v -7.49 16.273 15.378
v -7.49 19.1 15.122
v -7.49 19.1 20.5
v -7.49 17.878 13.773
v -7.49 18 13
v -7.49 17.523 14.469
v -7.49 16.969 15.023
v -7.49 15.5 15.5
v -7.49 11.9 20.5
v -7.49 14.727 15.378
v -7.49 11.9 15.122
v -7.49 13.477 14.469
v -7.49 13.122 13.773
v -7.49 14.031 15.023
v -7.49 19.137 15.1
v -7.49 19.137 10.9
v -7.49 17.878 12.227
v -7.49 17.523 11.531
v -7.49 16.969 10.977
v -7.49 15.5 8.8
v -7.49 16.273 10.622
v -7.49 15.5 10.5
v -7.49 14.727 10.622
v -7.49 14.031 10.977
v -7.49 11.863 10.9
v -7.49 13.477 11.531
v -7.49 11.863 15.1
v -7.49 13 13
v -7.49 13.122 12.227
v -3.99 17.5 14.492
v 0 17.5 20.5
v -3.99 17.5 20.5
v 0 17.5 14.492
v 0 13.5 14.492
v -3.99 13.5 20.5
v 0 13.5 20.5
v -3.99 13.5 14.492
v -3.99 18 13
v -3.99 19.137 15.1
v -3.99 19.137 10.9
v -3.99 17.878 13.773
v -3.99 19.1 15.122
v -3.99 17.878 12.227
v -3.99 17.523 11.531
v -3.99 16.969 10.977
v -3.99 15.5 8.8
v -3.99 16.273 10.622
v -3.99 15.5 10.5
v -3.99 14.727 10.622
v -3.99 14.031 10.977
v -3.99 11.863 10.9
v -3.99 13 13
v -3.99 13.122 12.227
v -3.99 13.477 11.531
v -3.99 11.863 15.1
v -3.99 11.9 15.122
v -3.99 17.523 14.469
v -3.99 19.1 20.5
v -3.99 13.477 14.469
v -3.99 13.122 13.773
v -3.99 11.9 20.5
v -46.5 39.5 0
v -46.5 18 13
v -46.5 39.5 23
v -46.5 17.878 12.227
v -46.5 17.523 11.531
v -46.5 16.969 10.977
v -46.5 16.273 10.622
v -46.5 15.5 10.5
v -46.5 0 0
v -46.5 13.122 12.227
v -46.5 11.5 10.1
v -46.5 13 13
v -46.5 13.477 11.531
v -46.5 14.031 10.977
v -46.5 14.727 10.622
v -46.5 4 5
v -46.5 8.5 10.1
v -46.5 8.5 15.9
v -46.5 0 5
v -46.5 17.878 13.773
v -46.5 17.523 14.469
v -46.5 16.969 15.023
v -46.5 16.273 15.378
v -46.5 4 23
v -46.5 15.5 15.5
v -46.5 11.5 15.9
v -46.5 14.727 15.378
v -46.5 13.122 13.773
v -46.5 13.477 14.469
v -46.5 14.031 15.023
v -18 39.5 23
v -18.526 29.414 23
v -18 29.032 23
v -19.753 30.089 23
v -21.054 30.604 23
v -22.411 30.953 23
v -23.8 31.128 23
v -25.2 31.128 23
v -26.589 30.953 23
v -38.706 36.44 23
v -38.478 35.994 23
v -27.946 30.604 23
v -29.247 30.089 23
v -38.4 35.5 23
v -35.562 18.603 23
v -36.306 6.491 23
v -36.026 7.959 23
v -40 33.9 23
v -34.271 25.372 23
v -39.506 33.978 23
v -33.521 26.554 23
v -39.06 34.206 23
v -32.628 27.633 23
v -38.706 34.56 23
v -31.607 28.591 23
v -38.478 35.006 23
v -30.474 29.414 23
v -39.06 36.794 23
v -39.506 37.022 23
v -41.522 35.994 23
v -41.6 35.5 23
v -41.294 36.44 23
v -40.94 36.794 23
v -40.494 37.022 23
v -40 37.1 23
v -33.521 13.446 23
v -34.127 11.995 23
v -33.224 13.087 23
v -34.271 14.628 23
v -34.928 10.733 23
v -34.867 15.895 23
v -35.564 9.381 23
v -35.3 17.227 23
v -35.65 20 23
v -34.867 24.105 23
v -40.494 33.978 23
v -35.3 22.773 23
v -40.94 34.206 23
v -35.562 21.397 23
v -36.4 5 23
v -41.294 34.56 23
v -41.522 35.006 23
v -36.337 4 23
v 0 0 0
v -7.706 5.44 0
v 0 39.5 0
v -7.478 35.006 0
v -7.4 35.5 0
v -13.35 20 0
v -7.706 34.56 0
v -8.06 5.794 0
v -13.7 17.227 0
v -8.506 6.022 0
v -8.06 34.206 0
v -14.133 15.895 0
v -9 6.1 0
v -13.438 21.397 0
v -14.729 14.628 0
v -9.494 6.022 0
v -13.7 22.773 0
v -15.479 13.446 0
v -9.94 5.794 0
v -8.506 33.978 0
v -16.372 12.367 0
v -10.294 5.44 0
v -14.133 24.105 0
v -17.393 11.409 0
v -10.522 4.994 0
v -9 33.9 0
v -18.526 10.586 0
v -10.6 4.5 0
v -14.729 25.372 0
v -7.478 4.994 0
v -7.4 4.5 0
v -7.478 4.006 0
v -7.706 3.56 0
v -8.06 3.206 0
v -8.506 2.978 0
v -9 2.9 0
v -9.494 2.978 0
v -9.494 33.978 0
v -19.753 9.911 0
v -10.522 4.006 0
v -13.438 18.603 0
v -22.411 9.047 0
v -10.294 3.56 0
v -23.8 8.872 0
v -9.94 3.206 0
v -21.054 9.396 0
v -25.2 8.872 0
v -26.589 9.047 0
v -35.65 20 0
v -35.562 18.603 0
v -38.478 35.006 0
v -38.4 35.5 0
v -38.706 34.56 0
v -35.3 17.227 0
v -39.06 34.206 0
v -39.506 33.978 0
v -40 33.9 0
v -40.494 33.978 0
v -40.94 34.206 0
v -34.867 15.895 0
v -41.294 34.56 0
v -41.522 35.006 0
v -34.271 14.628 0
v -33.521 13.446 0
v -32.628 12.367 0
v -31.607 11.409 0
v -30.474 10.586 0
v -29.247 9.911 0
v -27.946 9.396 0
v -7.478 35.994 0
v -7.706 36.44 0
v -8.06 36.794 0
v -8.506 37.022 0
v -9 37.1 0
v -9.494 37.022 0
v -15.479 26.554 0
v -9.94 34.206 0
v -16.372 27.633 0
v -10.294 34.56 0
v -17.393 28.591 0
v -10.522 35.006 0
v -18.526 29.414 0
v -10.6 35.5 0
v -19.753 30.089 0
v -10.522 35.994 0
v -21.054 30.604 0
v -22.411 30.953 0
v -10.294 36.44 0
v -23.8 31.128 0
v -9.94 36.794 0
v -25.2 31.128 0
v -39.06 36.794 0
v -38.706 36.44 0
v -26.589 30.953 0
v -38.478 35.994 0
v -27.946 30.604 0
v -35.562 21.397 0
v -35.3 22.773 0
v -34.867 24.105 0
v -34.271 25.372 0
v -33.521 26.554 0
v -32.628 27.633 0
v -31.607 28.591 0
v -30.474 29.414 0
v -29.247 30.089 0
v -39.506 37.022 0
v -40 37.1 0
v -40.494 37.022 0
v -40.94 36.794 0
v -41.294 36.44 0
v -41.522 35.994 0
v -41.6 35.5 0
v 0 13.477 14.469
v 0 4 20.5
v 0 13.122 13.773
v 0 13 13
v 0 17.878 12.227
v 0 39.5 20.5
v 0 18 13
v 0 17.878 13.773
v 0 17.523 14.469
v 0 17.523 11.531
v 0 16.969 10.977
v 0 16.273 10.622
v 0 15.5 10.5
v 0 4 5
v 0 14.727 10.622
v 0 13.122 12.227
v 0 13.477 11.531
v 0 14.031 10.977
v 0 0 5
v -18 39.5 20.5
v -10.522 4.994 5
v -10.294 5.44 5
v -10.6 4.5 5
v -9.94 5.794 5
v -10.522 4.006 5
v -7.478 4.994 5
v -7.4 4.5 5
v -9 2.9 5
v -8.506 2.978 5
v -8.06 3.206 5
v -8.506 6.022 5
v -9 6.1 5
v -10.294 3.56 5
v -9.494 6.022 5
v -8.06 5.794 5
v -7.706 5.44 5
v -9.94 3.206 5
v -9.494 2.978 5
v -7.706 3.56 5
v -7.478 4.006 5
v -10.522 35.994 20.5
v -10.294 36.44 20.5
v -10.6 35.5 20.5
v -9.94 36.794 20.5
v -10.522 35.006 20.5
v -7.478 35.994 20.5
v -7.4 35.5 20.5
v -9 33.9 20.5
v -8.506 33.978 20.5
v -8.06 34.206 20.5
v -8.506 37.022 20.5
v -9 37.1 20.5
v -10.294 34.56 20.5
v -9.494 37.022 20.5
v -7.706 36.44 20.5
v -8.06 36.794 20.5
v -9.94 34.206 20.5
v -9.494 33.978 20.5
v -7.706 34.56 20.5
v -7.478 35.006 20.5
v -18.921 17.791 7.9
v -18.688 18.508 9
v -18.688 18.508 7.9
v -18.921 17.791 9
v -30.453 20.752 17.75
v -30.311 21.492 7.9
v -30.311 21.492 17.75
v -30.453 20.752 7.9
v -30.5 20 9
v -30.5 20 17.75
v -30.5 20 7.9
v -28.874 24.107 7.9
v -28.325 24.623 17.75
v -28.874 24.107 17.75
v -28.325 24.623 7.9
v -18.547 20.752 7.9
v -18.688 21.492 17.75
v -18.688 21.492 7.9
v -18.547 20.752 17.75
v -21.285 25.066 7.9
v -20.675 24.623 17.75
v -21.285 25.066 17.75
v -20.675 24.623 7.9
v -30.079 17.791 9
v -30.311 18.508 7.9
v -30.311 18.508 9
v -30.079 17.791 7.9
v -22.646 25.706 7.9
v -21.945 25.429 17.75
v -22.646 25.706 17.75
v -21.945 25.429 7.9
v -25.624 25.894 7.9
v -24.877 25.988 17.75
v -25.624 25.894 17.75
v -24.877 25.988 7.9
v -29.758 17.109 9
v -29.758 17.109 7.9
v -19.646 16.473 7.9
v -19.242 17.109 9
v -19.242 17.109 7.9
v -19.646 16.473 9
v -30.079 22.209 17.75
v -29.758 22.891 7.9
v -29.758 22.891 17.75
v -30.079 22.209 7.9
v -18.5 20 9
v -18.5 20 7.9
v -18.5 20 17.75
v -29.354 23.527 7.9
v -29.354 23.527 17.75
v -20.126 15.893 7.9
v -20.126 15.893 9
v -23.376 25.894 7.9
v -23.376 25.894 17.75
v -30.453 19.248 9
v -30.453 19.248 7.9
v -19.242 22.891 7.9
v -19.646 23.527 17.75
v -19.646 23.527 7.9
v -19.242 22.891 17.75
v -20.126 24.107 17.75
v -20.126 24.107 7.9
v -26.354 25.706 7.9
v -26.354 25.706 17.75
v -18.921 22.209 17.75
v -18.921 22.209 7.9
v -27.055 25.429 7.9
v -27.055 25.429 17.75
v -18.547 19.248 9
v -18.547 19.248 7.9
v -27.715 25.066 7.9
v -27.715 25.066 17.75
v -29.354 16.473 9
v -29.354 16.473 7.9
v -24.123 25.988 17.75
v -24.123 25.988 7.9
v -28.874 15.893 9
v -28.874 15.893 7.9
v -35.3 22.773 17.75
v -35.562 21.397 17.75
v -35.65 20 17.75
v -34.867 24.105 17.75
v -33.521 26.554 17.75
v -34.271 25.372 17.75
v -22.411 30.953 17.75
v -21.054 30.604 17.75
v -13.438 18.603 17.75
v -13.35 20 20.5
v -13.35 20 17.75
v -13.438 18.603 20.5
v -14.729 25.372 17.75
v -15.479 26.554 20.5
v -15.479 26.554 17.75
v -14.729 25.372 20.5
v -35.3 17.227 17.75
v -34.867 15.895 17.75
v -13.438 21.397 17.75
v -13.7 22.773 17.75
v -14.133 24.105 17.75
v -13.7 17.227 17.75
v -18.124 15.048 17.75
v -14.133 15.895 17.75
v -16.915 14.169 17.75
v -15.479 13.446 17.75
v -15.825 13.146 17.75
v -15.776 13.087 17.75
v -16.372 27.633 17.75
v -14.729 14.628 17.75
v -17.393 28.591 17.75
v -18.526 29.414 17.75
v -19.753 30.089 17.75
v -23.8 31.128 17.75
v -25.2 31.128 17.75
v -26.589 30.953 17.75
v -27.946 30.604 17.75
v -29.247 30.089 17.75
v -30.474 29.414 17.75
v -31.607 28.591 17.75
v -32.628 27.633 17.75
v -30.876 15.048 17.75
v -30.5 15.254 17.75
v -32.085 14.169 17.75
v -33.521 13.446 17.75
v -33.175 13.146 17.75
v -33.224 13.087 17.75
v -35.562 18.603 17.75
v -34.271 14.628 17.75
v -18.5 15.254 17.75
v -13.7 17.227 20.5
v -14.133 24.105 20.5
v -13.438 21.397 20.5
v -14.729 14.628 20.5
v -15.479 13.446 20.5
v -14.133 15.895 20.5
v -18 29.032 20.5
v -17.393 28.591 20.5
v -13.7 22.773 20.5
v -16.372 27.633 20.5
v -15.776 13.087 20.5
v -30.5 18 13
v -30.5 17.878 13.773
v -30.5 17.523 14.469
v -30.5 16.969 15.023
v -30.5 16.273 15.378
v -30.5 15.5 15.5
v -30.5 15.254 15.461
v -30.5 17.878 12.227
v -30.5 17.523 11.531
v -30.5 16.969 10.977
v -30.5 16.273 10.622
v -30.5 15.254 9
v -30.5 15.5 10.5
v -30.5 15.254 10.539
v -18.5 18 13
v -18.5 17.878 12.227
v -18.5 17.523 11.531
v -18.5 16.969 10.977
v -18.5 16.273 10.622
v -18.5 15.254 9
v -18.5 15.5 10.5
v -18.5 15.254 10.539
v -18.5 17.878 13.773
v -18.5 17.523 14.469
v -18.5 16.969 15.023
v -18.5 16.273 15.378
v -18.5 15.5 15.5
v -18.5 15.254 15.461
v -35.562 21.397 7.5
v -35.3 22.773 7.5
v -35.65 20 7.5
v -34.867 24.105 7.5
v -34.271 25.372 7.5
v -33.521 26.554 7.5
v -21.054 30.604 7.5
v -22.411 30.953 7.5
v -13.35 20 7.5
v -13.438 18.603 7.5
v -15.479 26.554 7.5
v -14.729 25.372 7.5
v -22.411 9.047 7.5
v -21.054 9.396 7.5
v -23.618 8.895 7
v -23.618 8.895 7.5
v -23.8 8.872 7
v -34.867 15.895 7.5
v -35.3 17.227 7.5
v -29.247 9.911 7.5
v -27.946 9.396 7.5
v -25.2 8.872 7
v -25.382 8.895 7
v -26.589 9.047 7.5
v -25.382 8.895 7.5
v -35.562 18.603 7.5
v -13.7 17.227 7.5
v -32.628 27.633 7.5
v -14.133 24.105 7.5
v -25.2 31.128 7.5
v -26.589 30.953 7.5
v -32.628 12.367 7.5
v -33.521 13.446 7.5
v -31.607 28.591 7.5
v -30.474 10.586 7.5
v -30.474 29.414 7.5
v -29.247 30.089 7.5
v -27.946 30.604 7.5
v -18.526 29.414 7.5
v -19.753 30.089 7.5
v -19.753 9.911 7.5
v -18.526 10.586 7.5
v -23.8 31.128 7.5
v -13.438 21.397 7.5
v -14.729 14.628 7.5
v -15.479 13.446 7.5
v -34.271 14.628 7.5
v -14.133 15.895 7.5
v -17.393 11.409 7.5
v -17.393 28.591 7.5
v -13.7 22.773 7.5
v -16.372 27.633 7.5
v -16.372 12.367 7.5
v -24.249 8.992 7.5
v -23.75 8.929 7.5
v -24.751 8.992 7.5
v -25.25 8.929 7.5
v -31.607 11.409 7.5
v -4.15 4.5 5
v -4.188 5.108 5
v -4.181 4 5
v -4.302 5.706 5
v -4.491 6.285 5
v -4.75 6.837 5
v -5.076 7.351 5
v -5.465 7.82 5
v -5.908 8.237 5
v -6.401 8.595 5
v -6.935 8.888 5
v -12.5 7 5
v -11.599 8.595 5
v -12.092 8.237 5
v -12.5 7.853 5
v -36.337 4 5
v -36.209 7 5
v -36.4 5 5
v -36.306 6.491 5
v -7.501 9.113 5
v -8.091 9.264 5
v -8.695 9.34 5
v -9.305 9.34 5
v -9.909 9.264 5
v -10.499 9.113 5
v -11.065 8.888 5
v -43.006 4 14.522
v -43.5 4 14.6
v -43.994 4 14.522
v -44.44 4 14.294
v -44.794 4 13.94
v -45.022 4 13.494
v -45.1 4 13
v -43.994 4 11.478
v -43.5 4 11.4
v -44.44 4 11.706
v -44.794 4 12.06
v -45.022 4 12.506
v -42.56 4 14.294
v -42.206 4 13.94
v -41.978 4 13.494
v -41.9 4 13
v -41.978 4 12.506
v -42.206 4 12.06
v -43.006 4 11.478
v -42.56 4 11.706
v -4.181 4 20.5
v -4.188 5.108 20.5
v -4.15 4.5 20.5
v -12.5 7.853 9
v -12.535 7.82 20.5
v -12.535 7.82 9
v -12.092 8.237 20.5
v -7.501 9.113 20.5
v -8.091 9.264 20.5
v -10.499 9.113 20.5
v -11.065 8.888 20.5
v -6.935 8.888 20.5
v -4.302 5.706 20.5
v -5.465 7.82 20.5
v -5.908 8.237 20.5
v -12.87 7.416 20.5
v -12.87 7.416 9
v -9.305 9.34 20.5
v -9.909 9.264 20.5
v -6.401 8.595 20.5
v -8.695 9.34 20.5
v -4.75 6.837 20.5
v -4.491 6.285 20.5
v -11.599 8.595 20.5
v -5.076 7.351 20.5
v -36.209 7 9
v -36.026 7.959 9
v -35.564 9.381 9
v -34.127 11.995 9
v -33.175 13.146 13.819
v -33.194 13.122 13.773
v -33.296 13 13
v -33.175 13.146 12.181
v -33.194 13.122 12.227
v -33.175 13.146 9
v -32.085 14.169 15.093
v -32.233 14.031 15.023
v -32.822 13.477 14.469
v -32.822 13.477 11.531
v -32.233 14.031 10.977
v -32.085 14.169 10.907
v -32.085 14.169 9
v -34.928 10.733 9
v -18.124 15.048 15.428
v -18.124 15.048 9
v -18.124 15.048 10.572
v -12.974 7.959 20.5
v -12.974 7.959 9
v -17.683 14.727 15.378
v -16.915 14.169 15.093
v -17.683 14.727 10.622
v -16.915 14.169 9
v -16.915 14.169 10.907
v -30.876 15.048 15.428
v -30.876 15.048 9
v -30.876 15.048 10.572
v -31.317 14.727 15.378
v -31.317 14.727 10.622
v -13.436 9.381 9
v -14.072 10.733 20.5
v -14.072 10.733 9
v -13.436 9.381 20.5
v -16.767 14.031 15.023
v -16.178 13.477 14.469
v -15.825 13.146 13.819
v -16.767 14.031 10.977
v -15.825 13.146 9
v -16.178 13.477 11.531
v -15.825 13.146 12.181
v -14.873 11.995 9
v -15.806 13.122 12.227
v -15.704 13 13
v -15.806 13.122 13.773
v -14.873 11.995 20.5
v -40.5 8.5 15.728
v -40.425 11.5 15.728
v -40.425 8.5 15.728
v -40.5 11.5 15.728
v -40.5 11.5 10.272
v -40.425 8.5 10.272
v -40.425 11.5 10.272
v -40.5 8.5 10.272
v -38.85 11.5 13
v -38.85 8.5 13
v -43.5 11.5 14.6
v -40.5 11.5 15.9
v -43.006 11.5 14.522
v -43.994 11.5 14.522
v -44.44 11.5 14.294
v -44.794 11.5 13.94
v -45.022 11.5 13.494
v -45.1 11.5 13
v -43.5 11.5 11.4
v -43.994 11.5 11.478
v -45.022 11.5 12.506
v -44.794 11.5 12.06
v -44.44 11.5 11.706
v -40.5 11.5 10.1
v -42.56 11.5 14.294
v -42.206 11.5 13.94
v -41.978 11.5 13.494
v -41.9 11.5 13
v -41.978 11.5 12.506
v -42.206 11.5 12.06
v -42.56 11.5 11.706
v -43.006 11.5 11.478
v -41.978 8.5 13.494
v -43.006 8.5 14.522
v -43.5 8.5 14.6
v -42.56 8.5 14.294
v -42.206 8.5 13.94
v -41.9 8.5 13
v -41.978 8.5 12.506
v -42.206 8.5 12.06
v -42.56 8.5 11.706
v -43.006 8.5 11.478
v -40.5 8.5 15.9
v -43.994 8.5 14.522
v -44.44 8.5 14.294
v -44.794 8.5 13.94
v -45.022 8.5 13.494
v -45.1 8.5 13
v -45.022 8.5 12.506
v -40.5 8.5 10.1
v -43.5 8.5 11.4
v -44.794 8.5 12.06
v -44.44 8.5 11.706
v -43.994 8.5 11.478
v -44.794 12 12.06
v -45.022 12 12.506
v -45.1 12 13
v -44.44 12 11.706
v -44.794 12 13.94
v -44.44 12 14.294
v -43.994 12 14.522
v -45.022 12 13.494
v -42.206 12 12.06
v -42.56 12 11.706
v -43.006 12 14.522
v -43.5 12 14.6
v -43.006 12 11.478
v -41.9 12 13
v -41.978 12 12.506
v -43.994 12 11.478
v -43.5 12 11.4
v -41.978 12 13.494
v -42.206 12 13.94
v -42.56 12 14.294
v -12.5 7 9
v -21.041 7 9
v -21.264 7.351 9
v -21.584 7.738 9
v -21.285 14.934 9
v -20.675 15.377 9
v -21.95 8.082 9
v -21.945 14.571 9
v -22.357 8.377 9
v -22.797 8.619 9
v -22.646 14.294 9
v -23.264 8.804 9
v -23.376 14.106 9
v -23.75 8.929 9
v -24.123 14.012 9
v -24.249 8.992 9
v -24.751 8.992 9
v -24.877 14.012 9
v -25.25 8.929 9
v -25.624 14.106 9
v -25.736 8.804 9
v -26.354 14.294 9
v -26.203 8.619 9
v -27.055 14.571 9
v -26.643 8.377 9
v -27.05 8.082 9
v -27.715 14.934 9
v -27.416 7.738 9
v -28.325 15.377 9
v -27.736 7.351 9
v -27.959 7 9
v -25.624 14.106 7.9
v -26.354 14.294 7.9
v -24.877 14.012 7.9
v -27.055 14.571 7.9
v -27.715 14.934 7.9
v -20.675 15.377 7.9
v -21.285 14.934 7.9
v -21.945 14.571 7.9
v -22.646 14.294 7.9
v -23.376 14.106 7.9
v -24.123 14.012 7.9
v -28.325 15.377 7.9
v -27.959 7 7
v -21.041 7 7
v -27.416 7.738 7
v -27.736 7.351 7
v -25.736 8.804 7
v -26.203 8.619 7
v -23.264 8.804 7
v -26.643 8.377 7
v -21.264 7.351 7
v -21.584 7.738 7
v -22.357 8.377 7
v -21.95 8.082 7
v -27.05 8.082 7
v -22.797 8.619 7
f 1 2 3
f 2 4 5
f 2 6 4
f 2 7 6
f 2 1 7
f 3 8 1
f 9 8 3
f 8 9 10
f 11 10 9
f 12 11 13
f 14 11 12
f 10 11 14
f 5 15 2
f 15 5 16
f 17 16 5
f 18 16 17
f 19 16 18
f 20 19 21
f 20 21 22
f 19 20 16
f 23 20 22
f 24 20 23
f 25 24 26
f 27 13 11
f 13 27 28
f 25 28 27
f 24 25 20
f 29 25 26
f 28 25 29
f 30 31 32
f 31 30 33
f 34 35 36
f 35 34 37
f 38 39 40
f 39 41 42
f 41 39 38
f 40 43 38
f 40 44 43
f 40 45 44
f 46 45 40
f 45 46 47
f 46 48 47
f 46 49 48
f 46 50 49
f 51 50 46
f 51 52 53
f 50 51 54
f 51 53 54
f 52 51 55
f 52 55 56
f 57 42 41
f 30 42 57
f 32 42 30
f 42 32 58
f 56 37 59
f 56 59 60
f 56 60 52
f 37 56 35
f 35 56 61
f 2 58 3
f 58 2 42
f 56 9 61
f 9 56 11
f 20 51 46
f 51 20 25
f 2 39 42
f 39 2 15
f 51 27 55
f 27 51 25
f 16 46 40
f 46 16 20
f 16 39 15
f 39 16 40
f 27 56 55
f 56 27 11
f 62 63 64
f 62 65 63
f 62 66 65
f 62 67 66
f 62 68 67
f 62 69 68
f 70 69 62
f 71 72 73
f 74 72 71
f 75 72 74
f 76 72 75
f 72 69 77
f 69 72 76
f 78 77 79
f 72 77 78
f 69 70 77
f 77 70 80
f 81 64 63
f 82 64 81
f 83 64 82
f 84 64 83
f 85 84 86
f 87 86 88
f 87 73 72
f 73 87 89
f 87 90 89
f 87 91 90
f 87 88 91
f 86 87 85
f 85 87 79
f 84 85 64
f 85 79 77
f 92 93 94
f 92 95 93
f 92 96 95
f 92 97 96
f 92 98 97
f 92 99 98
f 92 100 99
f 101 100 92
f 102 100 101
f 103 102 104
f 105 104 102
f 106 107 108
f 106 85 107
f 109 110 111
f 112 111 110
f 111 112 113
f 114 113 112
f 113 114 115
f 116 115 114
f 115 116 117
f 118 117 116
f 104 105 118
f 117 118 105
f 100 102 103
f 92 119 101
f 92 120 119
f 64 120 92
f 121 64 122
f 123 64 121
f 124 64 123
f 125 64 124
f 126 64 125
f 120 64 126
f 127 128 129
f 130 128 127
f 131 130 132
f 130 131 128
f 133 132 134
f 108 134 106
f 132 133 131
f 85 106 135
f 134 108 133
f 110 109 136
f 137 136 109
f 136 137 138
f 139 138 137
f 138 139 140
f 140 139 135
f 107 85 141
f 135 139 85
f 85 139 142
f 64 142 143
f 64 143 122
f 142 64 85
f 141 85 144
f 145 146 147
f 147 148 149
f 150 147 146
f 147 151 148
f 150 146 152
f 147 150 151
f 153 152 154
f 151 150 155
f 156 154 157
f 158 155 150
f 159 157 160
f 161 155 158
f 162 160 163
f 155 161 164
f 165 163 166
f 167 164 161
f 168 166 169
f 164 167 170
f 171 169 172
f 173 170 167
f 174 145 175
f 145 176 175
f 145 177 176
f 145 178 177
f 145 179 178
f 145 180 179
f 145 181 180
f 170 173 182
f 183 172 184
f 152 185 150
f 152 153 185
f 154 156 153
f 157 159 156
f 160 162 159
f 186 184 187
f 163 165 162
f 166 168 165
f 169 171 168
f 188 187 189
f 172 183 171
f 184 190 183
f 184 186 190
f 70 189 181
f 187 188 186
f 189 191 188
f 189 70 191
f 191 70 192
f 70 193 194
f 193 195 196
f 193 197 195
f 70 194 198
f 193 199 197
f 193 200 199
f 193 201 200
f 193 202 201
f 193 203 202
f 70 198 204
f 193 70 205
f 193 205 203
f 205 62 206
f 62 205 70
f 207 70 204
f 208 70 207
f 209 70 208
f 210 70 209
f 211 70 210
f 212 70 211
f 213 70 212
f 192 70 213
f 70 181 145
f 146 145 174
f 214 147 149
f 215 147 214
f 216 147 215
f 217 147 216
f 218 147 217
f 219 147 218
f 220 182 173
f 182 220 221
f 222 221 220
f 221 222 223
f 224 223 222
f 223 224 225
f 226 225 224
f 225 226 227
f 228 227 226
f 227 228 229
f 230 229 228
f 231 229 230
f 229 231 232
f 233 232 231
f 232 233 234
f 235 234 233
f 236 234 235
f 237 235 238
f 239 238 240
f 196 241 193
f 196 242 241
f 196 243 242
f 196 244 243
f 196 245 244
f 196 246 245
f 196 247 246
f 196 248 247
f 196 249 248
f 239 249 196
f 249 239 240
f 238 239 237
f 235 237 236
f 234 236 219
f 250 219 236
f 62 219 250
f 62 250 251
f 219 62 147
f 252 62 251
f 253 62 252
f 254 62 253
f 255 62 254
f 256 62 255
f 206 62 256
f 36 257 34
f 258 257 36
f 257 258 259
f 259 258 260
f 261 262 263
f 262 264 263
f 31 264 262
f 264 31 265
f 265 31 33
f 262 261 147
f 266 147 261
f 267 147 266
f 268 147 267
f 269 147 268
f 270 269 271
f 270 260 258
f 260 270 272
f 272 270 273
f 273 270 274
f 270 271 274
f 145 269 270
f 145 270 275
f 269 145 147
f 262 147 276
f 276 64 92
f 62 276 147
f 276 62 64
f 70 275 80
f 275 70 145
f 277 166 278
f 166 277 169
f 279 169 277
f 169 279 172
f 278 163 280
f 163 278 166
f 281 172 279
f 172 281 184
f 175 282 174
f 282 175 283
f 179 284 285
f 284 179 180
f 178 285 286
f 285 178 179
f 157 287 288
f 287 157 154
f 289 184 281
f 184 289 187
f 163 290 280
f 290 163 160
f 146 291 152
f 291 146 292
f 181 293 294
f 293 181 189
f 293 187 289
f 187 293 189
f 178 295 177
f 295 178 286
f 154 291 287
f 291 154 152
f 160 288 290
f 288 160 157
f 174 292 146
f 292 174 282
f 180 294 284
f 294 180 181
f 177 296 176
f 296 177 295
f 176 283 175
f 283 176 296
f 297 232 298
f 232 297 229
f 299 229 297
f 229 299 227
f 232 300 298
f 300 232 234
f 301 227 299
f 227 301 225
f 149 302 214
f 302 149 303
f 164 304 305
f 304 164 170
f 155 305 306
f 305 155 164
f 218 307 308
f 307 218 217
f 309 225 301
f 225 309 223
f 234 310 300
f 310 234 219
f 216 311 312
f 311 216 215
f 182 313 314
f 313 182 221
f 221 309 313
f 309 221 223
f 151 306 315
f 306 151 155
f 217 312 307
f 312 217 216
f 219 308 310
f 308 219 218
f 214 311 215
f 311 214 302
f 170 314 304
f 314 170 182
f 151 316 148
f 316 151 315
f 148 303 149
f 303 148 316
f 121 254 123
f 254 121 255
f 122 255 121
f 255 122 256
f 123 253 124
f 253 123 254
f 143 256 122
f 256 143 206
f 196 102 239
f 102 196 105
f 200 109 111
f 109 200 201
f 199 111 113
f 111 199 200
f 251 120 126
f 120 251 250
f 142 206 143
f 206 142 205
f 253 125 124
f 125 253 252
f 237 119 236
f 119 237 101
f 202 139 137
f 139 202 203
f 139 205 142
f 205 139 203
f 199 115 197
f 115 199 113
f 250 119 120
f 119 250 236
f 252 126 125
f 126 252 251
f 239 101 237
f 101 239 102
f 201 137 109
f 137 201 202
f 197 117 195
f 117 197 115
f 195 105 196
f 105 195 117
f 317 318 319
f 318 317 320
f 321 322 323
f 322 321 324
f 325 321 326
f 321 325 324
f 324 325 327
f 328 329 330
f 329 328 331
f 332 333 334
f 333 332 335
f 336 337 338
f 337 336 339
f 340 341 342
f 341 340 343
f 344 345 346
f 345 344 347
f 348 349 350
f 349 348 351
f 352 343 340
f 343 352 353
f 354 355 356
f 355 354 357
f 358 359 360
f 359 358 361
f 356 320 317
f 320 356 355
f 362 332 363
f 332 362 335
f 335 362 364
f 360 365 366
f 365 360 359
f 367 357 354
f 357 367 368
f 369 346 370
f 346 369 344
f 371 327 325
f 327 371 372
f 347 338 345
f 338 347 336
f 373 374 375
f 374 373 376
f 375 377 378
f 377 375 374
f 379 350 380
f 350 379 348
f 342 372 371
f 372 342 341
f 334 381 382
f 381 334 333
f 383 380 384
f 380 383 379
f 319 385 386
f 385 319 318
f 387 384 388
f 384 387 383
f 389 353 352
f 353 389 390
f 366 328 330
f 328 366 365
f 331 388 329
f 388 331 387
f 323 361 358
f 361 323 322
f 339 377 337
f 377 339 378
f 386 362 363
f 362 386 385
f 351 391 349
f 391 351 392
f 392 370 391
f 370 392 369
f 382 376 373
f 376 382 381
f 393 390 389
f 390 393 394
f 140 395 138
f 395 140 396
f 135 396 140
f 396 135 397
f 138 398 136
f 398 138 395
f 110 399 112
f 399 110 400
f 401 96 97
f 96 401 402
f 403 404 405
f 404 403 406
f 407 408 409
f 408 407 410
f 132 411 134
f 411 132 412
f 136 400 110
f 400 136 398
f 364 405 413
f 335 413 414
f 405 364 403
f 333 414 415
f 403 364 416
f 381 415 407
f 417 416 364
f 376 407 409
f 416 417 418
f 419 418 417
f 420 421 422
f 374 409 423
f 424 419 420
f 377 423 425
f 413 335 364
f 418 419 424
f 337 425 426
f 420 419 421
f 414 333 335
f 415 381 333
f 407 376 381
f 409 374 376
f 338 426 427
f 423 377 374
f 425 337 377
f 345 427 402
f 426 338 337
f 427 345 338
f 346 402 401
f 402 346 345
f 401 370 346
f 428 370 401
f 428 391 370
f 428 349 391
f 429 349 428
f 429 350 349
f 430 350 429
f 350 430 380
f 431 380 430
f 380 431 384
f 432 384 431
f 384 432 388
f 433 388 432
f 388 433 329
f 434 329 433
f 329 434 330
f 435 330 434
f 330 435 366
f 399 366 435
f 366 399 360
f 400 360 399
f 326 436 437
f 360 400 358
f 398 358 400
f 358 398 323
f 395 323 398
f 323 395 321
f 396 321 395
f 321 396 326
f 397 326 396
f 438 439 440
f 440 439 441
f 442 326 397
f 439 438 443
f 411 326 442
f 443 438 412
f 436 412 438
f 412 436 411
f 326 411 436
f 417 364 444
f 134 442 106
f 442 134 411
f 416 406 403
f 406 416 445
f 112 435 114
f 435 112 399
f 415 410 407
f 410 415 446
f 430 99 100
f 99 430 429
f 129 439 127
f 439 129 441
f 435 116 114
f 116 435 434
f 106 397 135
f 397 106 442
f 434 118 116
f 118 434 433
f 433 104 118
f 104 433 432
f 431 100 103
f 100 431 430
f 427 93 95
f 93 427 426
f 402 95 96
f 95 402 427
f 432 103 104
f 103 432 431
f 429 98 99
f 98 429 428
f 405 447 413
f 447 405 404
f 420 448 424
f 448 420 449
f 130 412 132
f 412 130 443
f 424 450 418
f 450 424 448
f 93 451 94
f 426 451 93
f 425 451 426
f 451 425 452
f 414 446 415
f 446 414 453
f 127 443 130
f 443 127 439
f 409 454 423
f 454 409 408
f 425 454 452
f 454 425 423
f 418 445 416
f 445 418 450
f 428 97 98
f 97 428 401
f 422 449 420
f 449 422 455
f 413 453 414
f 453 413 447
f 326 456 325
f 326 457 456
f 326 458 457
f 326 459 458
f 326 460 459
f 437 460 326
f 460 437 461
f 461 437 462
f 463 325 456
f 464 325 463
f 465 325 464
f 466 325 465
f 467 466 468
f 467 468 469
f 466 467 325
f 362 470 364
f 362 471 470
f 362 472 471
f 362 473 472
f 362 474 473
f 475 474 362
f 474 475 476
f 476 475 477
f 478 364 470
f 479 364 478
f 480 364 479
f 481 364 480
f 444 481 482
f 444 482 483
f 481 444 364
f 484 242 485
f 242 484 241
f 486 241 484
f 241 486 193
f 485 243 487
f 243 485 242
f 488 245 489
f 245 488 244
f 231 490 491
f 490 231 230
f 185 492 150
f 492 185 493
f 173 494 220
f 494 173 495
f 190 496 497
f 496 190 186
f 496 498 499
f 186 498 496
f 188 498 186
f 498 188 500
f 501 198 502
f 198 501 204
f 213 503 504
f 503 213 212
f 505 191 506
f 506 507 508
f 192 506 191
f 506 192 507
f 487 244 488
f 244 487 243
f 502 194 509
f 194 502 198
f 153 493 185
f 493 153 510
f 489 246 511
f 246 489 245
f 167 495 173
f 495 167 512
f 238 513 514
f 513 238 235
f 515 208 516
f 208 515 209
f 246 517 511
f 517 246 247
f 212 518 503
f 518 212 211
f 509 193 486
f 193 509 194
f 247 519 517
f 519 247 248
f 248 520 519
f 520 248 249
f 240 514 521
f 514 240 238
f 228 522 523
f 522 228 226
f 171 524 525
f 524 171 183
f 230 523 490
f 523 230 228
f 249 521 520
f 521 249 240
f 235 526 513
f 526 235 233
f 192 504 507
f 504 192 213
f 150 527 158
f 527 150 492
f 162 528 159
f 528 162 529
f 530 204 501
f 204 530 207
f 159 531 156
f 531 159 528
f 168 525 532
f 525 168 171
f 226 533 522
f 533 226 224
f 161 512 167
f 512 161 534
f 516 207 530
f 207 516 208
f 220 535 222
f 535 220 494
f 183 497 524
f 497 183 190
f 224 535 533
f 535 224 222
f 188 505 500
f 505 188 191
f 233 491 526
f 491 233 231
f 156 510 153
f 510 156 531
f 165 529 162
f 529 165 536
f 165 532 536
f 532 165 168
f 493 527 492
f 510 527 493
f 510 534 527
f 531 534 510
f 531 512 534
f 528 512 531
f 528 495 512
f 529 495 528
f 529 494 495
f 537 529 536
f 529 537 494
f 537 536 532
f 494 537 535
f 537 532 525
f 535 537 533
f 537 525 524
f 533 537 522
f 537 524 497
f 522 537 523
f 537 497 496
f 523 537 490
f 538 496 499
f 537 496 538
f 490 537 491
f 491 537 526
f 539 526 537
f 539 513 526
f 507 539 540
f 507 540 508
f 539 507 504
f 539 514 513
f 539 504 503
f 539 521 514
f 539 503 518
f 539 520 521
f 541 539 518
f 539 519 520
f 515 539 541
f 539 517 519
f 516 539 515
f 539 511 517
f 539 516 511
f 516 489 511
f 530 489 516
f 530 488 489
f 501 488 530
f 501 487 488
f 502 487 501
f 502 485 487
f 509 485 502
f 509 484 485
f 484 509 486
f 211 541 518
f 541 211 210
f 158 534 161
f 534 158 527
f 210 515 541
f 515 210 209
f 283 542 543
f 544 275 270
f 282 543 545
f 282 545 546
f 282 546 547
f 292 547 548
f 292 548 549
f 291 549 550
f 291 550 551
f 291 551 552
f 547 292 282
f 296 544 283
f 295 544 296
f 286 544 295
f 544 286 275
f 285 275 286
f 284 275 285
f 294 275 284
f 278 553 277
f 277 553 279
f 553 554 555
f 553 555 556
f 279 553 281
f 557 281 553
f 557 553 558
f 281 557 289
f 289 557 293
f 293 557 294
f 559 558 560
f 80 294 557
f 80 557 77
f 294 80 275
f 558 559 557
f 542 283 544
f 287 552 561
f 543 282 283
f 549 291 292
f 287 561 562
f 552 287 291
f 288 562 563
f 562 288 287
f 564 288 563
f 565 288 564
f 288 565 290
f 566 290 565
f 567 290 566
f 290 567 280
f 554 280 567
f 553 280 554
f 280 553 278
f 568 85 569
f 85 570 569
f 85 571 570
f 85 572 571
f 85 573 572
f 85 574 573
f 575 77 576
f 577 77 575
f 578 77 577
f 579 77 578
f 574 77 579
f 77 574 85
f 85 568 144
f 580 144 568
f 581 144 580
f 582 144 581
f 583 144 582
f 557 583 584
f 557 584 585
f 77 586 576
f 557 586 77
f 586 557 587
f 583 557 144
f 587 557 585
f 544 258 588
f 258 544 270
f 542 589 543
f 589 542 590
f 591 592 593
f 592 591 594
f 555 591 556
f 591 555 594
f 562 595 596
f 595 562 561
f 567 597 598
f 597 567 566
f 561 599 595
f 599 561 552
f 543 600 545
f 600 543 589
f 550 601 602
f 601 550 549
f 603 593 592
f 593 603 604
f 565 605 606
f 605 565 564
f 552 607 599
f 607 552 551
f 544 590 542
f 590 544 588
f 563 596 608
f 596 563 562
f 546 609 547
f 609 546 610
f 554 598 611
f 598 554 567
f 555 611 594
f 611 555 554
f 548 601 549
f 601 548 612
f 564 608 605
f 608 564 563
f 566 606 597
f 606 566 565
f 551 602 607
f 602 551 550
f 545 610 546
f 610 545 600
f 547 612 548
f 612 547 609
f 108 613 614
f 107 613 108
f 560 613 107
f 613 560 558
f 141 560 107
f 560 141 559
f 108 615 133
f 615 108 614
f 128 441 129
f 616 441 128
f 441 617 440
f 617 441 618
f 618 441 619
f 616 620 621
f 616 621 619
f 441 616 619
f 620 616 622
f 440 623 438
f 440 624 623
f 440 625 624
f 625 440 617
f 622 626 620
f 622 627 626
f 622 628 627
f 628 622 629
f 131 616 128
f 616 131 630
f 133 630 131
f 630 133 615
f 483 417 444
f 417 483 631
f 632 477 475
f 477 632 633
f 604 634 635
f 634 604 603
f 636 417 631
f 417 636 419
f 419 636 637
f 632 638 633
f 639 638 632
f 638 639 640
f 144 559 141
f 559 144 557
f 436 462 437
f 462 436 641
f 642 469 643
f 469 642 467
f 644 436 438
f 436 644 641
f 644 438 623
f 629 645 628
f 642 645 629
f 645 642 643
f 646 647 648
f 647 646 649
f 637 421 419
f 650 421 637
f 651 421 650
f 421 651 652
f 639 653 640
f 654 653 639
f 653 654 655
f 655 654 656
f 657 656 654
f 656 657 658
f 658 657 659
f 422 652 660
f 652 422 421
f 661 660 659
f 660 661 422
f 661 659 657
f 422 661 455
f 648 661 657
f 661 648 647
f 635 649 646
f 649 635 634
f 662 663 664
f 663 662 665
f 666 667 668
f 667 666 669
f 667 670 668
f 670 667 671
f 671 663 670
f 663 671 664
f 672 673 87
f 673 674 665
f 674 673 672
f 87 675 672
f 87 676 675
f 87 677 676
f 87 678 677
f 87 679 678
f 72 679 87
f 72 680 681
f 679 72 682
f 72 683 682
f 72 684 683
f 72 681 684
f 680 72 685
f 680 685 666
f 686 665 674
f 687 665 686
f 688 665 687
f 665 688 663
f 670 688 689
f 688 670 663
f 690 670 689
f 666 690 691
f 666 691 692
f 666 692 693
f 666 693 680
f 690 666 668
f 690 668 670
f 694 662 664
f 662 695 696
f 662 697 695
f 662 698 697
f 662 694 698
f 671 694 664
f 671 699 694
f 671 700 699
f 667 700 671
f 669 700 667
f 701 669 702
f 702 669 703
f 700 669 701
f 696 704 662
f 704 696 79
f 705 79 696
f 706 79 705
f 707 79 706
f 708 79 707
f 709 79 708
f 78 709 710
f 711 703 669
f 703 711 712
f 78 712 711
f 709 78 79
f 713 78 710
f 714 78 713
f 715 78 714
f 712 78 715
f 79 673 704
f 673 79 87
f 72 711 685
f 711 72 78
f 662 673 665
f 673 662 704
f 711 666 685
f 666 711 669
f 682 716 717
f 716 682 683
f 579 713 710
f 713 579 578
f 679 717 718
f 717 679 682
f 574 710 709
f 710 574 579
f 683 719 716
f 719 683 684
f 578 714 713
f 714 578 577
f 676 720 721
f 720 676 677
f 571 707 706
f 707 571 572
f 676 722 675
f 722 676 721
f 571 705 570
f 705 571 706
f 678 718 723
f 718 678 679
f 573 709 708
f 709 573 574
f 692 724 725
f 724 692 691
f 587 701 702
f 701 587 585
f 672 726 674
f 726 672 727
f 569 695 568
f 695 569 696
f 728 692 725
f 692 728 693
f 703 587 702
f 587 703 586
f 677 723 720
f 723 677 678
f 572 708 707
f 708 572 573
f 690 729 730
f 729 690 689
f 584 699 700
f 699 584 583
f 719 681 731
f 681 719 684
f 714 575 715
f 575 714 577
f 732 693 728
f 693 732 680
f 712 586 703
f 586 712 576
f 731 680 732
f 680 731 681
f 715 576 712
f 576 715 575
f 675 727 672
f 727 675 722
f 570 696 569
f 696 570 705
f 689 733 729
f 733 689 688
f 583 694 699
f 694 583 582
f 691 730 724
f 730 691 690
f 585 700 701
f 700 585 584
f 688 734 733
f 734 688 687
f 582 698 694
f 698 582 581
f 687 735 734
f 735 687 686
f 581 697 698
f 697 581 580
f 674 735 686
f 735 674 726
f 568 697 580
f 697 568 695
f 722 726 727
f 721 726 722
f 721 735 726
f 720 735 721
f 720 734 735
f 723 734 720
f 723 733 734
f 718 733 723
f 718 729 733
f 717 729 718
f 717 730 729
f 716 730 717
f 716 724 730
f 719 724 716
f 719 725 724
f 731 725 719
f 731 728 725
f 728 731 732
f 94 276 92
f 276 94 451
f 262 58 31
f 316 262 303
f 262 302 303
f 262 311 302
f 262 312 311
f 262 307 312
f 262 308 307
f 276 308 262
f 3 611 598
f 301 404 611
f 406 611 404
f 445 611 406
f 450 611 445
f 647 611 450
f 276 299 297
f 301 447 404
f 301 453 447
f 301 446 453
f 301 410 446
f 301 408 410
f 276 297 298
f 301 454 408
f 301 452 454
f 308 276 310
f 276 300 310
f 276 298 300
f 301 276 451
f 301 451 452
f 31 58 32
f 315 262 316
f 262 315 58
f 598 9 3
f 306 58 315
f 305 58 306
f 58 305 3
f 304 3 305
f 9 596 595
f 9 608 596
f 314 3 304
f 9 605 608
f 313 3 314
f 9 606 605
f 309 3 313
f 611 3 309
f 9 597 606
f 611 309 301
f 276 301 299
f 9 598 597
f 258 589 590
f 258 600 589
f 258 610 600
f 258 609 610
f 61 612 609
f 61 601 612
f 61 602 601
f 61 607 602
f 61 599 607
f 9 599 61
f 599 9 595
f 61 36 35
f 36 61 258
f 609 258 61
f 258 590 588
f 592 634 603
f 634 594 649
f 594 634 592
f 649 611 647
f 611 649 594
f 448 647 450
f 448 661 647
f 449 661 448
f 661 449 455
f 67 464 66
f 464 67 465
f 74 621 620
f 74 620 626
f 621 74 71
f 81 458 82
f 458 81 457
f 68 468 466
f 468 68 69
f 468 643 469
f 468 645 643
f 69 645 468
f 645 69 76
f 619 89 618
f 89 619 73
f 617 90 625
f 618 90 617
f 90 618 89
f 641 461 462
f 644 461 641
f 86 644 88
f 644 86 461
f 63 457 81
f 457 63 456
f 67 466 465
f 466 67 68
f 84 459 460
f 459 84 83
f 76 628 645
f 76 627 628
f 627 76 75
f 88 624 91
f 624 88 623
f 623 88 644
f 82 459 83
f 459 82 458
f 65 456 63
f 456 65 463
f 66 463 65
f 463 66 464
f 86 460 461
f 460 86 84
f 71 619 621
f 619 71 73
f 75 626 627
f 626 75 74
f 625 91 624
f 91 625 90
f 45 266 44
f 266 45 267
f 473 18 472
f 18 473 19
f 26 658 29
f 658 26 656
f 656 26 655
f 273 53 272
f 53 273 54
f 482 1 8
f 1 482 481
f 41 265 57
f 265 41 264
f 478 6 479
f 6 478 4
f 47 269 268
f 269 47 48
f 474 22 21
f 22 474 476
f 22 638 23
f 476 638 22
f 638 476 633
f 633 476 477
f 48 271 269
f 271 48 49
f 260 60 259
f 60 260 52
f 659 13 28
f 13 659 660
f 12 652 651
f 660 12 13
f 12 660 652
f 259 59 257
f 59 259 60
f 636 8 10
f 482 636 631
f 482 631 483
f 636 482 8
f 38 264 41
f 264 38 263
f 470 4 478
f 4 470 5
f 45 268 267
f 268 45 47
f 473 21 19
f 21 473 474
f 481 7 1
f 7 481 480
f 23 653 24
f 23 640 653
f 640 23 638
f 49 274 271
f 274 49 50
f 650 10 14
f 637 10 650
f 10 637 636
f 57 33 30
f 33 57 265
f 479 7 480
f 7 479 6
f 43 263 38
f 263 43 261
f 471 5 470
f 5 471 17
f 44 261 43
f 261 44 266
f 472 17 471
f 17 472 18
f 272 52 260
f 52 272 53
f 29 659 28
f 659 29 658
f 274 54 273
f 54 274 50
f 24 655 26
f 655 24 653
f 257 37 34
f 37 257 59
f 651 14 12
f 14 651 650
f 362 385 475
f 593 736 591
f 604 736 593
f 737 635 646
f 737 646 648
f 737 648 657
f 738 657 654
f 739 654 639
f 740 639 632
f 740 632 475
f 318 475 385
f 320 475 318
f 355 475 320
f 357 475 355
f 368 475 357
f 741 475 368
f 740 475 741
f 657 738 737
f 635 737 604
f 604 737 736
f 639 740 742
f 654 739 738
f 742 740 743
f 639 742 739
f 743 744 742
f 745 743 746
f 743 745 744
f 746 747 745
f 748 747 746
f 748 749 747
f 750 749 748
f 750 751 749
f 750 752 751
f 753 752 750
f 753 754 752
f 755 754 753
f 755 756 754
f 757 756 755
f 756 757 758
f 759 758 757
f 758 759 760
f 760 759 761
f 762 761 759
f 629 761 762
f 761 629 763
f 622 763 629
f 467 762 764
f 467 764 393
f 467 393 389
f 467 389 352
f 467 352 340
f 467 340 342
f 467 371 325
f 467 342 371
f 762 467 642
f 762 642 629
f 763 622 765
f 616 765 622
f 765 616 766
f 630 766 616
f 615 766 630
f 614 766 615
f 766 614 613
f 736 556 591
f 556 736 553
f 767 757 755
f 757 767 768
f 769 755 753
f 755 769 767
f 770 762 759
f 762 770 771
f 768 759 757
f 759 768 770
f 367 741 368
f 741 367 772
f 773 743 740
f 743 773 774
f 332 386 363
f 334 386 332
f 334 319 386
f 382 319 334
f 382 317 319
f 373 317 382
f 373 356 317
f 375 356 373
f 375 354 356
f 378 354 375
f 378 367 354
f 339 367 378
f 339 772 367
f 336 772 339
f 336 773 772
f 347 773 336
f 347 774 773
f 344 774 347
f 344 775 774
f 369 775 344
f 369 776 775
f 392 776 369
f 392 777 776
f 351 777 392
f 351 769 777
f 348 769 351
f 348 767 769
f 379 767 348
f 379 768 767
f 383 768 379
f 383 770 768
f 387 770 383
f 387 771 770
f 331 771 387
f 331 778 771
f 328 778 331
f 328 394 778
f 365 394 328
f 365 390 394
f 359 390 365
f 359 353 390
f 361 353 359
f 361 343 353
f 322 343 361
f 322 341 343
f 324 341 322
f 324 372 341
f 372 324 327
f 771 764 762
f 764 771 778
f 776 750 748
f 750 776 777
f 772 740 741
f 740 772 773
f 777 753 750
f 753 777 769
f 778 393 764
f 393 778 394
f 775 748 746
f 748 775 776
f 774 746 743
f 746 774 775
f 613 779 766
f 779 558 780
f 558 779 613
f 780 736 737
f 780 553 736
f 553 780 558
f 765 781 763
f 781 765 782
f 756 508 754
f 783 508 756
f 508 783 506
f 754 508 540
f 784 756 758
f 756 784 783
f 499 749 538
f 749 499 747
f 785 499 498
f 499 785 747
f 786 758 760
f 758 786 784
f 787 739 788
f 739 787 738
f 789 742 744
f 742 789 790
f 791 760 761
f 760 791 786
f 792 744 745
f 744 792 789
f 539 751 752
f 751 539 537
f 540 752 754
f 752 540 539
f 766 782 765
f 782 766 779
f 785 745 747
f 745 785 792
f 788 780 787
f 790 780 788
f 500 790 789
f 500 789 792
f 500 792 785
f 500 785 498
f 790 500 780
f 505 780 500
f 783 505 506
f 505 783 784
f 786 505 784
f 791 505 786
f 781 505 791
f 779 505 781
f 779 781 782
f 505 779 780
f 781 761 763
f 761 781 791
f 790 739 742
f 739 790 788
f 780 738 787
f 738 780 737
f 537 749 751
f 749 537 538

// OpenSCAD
// file: head-part02.scad
include <config.scad>

//x=43;
//y=36;
z=23;

// отверстия под болты М3
d1=3.2;
d2=23;
// диаметр гнезда под подшипник
d22=22.3;
d3=12;
d4=9.7;
d5=5;
d6=12.5;

//x0=5.5;
x00=6.5;
y0=4;
//y00=4;
x1=24.5;
y1=20;
z1=z-6.25;

y2=15.5;
z2=13;
y22=15.5;
z22=13;
y3=3;
z3=6.3;

y4=4;
y5=9;
z4=2.5;
x5=24.5;
y6=5;
x6=14;
z6=5;

module nut() {
	translate([0,0,8.75])rotate([90,0,90])cylinder(z6,r=7/2,$fn=6);
}
module hole() {
	translate([0,0,8.75])rotate([90,0,90])cylinder(5,r=d1/2,$fn=20);
}

module head_part02(bowden=false) {
// freecad positioning
//translate([15.5,13,17.5])rotate([-90,-90,180])
mirror([1,0,0])
union() {
difference() {
    x=bowden?46.5:43;
    y=bowden?39.5:36;
    x0=bowden?9:5.5;
    y00=bowden?4.5:4;

	// main part
	cube([x,y,z]);

	// horizontal section
	//translate([-1,-1,1])cube([x+2,y+2,z]);

	// bolts
	translate([x0,y00,-1])cylinder(z+2,r=d1/2,$fn=20);
	translate([x0,y-y0,-1])cylinder(z+2,r=d1/2,$fn=20);
	translate([x-x00,y-y0,-1])cylinder(z+2,r=d1/2,$fn=20);

	// hobbed bolt
	//translate([x1,y1,-1])cylinder(z+2,r=5.8/2,$fn=50);
	//translate([x1,y1,-1])cylinder(z+2,r=4,$fn=50);

	// bearings
	translate([x1,y1,-1])cylinder(z+2,r=d3/2,$fn=50);
// поднимаем подшипник на 1 мм для плотной посадки в каретку экструдера
	translate([x1,y1,z1+1])cylinder(7,r=d22/2,$fn=50);
	translate([x1-d3/2,y1-8,z1-7.8])cube([d3,8,9]);
	translate([x1,y1,-1])cylinder(8.5,r=d22/2,$fn=50);

	// part19 slot
	translate([-1,-1,5])cube([x+2,y4+1,z-4]);
	translate([x0,-1,5])cube([x/2-x0,8,z-4]);
	translate([x0,y00,5])cylinder(z-4,r=d4/2,$fn=50);

	// part19 bearing
	translate([x5,y6,5])cylinder(z-4,r=d2/2+0.4,$fn=50);
	translate([x5,y6,7])cylinder(13,r=4,$fn=50);
	translate([x5,y6,10])cylinder(7,r=11,$fn=50);

	// part19 nut
	translate([x-4.5,y2-7,z2])rotate([-90,0,0])cylinder(y3,r=z3/2,$fn=6);
	translate([x-6,y2-7,z2-z3/2+0.25])cube([7,y3,z3-0.5]);
	translate([x-3,y4-1,z2])rotate([-90,0,0])cylinder(y5,r=d1/2,$fn=20);

	// profile slot
	translate([-1,-1,z-z4])cube([19,y+2,z4+1]);

	// ABS plastic 3mm
	//translate([-1,y2,z2])rotate([0,90,0])cylinder(x+2,r=3/2,$fn=20);
	translate([x1,y2,z2])rotate([0,90,0])cylinder(x-x1+1,r=d5/2,$fn=20);
	translate([-1,y22,z22])rotate([0,90,0])cylinder(x1+1,r=d5/2,$fn=20);

	// Отверстие под термобарьер с резьбой. Выдвигаем на 0.7 мм чтобы был зазор между радиатором и соплом
    if (bowden) {
        translate([4-0.01,y22,13])bowden();
    } else {
        translate([41,y22,13])mirror([1,0,0])bowden();
        translate([-1-0.7,y22,z22])rotate([0,90,0])cylinder(x6,r=d6/2,$fn=50);

        // hotend nuts
        for(i=[0:2])translate([-1,y22,z2])rotate([120*i+60,0,0])nut();
        for(i=[0:2])translate([2,y22,z2])rotate([120*i+60,0,0])hole();
	//translate([-1,y22-13.5,z-z4+1])rotate([0,90,0])cube([7.15,8,z6-.2]);

        translate([-6,0,14.34]) cube([10,10,10]);
        translate([-1,21.3,14.34]) cube([5,3.5,10]);
    }
}

// bearing cap & support
difference() {
	union() {
		translate([x1,y1,0.5])cylinder(8.5,r=d2/2+1.5,$fn=50);
		translate([12.5,6.9,0.5])cube([24,5,8.5]);
	}
	translate([x1,y1,7.9])cylinder(15,r=d3/2,$fn=50);
	translate([x1,y1,-1])cylinder(8.5,r=d22/2,$fn=50);
	translate([0.5,y1-d22/4,0.5])cube([14.5,d22/2,10]);
	translate([12,2,0.5])cube([25,5,9]);
	translate([-1,y22,z22])rotate([0,90,0])cylinder(x6,r=d6/2,$fn=50);
	translate([x5,y6,7])cylinder(13,r=4,$fn=50);
}
}
}

module bowden() {
    // расстояние от стенок до гайки
    DELTA = 0.3;
    // гайка М4
    // высота
    h=m4_hole[0];
    // макс. диаметр
    d=m4_hole[1];
    // между стенками (размер ключа)
    k=m4_hole[2];
    
    translate([-4,-2,0])cube([7.5,4,11]);
    translate([0,-k/2,0])cube([h,k,11]);
    rotate([0,90,0])cylinder(r=d/2,h=h,$fn=6);
}

head_part02(false);
// file: config.scad
/**
 * Глобальный конфигурационный файл
 */
// качество цилиндров
$fn=30;

// избегание совпадения граней
DELTA=0.1;

// толщина рамы
FRAME=18;

// расстояние от стенок до гайки
DELTA_NUT = 0.3;
// высота, макс. диаметр, между стенками (размер ключа)
// гайка М3
m3_base=[2.4,6.4,5.5];
m3_hole=m3_base+[DELTA_NUT,DELTA_NUT,DELTA_NUT];
//[3,7,6]
// гайка М4
m4_base=[3.2,8.1,6.9];
m4_hole=m4_base+[DELTA_NUT,DELTA_NUT,DELTA_NUT];
// гайка М5
m5_base=[3.8,9.1,7.9];
m5_hole=m5_base+[DELTA_NUT,DELTA_NUT,DELTA_NUT];
// main file
/**
 * Bowden head (c) Andrew Answer 08 Oct 2015
 * I use modified original head for it
 */
include <config.scad>
use <head-part02.scad>
//use <head-part03-bowden.scad>

module motor() {
    difference() {
intersection(){
    cube([42,42,8],true);
    rotate([0,0,45])cube([38*sqrt(2),38*sqrt(2),8],true);
}
    translate([0,0,-5])cylinder(r=22.3/2,h=10,$fn=50);
    translate([-31/2,-31/2,-5])cylinder(r=3/2,h=10);
    translate([-31/2,31/2,-5])cylinder(r=3/2,h=10);
    translate([31/2,-31/2,-5])cylinder(r=3/2,h=10);
    translate([31/2,31/2,-5])cylinder(r=3/2,h=10);
}
}

//color([0,0.5,0.8])translate([-24.5,20,-4])motor();
head_part02(true);
//translate([-43-3.5,-4.5,5])rotate([90,0,180])head_part03();
